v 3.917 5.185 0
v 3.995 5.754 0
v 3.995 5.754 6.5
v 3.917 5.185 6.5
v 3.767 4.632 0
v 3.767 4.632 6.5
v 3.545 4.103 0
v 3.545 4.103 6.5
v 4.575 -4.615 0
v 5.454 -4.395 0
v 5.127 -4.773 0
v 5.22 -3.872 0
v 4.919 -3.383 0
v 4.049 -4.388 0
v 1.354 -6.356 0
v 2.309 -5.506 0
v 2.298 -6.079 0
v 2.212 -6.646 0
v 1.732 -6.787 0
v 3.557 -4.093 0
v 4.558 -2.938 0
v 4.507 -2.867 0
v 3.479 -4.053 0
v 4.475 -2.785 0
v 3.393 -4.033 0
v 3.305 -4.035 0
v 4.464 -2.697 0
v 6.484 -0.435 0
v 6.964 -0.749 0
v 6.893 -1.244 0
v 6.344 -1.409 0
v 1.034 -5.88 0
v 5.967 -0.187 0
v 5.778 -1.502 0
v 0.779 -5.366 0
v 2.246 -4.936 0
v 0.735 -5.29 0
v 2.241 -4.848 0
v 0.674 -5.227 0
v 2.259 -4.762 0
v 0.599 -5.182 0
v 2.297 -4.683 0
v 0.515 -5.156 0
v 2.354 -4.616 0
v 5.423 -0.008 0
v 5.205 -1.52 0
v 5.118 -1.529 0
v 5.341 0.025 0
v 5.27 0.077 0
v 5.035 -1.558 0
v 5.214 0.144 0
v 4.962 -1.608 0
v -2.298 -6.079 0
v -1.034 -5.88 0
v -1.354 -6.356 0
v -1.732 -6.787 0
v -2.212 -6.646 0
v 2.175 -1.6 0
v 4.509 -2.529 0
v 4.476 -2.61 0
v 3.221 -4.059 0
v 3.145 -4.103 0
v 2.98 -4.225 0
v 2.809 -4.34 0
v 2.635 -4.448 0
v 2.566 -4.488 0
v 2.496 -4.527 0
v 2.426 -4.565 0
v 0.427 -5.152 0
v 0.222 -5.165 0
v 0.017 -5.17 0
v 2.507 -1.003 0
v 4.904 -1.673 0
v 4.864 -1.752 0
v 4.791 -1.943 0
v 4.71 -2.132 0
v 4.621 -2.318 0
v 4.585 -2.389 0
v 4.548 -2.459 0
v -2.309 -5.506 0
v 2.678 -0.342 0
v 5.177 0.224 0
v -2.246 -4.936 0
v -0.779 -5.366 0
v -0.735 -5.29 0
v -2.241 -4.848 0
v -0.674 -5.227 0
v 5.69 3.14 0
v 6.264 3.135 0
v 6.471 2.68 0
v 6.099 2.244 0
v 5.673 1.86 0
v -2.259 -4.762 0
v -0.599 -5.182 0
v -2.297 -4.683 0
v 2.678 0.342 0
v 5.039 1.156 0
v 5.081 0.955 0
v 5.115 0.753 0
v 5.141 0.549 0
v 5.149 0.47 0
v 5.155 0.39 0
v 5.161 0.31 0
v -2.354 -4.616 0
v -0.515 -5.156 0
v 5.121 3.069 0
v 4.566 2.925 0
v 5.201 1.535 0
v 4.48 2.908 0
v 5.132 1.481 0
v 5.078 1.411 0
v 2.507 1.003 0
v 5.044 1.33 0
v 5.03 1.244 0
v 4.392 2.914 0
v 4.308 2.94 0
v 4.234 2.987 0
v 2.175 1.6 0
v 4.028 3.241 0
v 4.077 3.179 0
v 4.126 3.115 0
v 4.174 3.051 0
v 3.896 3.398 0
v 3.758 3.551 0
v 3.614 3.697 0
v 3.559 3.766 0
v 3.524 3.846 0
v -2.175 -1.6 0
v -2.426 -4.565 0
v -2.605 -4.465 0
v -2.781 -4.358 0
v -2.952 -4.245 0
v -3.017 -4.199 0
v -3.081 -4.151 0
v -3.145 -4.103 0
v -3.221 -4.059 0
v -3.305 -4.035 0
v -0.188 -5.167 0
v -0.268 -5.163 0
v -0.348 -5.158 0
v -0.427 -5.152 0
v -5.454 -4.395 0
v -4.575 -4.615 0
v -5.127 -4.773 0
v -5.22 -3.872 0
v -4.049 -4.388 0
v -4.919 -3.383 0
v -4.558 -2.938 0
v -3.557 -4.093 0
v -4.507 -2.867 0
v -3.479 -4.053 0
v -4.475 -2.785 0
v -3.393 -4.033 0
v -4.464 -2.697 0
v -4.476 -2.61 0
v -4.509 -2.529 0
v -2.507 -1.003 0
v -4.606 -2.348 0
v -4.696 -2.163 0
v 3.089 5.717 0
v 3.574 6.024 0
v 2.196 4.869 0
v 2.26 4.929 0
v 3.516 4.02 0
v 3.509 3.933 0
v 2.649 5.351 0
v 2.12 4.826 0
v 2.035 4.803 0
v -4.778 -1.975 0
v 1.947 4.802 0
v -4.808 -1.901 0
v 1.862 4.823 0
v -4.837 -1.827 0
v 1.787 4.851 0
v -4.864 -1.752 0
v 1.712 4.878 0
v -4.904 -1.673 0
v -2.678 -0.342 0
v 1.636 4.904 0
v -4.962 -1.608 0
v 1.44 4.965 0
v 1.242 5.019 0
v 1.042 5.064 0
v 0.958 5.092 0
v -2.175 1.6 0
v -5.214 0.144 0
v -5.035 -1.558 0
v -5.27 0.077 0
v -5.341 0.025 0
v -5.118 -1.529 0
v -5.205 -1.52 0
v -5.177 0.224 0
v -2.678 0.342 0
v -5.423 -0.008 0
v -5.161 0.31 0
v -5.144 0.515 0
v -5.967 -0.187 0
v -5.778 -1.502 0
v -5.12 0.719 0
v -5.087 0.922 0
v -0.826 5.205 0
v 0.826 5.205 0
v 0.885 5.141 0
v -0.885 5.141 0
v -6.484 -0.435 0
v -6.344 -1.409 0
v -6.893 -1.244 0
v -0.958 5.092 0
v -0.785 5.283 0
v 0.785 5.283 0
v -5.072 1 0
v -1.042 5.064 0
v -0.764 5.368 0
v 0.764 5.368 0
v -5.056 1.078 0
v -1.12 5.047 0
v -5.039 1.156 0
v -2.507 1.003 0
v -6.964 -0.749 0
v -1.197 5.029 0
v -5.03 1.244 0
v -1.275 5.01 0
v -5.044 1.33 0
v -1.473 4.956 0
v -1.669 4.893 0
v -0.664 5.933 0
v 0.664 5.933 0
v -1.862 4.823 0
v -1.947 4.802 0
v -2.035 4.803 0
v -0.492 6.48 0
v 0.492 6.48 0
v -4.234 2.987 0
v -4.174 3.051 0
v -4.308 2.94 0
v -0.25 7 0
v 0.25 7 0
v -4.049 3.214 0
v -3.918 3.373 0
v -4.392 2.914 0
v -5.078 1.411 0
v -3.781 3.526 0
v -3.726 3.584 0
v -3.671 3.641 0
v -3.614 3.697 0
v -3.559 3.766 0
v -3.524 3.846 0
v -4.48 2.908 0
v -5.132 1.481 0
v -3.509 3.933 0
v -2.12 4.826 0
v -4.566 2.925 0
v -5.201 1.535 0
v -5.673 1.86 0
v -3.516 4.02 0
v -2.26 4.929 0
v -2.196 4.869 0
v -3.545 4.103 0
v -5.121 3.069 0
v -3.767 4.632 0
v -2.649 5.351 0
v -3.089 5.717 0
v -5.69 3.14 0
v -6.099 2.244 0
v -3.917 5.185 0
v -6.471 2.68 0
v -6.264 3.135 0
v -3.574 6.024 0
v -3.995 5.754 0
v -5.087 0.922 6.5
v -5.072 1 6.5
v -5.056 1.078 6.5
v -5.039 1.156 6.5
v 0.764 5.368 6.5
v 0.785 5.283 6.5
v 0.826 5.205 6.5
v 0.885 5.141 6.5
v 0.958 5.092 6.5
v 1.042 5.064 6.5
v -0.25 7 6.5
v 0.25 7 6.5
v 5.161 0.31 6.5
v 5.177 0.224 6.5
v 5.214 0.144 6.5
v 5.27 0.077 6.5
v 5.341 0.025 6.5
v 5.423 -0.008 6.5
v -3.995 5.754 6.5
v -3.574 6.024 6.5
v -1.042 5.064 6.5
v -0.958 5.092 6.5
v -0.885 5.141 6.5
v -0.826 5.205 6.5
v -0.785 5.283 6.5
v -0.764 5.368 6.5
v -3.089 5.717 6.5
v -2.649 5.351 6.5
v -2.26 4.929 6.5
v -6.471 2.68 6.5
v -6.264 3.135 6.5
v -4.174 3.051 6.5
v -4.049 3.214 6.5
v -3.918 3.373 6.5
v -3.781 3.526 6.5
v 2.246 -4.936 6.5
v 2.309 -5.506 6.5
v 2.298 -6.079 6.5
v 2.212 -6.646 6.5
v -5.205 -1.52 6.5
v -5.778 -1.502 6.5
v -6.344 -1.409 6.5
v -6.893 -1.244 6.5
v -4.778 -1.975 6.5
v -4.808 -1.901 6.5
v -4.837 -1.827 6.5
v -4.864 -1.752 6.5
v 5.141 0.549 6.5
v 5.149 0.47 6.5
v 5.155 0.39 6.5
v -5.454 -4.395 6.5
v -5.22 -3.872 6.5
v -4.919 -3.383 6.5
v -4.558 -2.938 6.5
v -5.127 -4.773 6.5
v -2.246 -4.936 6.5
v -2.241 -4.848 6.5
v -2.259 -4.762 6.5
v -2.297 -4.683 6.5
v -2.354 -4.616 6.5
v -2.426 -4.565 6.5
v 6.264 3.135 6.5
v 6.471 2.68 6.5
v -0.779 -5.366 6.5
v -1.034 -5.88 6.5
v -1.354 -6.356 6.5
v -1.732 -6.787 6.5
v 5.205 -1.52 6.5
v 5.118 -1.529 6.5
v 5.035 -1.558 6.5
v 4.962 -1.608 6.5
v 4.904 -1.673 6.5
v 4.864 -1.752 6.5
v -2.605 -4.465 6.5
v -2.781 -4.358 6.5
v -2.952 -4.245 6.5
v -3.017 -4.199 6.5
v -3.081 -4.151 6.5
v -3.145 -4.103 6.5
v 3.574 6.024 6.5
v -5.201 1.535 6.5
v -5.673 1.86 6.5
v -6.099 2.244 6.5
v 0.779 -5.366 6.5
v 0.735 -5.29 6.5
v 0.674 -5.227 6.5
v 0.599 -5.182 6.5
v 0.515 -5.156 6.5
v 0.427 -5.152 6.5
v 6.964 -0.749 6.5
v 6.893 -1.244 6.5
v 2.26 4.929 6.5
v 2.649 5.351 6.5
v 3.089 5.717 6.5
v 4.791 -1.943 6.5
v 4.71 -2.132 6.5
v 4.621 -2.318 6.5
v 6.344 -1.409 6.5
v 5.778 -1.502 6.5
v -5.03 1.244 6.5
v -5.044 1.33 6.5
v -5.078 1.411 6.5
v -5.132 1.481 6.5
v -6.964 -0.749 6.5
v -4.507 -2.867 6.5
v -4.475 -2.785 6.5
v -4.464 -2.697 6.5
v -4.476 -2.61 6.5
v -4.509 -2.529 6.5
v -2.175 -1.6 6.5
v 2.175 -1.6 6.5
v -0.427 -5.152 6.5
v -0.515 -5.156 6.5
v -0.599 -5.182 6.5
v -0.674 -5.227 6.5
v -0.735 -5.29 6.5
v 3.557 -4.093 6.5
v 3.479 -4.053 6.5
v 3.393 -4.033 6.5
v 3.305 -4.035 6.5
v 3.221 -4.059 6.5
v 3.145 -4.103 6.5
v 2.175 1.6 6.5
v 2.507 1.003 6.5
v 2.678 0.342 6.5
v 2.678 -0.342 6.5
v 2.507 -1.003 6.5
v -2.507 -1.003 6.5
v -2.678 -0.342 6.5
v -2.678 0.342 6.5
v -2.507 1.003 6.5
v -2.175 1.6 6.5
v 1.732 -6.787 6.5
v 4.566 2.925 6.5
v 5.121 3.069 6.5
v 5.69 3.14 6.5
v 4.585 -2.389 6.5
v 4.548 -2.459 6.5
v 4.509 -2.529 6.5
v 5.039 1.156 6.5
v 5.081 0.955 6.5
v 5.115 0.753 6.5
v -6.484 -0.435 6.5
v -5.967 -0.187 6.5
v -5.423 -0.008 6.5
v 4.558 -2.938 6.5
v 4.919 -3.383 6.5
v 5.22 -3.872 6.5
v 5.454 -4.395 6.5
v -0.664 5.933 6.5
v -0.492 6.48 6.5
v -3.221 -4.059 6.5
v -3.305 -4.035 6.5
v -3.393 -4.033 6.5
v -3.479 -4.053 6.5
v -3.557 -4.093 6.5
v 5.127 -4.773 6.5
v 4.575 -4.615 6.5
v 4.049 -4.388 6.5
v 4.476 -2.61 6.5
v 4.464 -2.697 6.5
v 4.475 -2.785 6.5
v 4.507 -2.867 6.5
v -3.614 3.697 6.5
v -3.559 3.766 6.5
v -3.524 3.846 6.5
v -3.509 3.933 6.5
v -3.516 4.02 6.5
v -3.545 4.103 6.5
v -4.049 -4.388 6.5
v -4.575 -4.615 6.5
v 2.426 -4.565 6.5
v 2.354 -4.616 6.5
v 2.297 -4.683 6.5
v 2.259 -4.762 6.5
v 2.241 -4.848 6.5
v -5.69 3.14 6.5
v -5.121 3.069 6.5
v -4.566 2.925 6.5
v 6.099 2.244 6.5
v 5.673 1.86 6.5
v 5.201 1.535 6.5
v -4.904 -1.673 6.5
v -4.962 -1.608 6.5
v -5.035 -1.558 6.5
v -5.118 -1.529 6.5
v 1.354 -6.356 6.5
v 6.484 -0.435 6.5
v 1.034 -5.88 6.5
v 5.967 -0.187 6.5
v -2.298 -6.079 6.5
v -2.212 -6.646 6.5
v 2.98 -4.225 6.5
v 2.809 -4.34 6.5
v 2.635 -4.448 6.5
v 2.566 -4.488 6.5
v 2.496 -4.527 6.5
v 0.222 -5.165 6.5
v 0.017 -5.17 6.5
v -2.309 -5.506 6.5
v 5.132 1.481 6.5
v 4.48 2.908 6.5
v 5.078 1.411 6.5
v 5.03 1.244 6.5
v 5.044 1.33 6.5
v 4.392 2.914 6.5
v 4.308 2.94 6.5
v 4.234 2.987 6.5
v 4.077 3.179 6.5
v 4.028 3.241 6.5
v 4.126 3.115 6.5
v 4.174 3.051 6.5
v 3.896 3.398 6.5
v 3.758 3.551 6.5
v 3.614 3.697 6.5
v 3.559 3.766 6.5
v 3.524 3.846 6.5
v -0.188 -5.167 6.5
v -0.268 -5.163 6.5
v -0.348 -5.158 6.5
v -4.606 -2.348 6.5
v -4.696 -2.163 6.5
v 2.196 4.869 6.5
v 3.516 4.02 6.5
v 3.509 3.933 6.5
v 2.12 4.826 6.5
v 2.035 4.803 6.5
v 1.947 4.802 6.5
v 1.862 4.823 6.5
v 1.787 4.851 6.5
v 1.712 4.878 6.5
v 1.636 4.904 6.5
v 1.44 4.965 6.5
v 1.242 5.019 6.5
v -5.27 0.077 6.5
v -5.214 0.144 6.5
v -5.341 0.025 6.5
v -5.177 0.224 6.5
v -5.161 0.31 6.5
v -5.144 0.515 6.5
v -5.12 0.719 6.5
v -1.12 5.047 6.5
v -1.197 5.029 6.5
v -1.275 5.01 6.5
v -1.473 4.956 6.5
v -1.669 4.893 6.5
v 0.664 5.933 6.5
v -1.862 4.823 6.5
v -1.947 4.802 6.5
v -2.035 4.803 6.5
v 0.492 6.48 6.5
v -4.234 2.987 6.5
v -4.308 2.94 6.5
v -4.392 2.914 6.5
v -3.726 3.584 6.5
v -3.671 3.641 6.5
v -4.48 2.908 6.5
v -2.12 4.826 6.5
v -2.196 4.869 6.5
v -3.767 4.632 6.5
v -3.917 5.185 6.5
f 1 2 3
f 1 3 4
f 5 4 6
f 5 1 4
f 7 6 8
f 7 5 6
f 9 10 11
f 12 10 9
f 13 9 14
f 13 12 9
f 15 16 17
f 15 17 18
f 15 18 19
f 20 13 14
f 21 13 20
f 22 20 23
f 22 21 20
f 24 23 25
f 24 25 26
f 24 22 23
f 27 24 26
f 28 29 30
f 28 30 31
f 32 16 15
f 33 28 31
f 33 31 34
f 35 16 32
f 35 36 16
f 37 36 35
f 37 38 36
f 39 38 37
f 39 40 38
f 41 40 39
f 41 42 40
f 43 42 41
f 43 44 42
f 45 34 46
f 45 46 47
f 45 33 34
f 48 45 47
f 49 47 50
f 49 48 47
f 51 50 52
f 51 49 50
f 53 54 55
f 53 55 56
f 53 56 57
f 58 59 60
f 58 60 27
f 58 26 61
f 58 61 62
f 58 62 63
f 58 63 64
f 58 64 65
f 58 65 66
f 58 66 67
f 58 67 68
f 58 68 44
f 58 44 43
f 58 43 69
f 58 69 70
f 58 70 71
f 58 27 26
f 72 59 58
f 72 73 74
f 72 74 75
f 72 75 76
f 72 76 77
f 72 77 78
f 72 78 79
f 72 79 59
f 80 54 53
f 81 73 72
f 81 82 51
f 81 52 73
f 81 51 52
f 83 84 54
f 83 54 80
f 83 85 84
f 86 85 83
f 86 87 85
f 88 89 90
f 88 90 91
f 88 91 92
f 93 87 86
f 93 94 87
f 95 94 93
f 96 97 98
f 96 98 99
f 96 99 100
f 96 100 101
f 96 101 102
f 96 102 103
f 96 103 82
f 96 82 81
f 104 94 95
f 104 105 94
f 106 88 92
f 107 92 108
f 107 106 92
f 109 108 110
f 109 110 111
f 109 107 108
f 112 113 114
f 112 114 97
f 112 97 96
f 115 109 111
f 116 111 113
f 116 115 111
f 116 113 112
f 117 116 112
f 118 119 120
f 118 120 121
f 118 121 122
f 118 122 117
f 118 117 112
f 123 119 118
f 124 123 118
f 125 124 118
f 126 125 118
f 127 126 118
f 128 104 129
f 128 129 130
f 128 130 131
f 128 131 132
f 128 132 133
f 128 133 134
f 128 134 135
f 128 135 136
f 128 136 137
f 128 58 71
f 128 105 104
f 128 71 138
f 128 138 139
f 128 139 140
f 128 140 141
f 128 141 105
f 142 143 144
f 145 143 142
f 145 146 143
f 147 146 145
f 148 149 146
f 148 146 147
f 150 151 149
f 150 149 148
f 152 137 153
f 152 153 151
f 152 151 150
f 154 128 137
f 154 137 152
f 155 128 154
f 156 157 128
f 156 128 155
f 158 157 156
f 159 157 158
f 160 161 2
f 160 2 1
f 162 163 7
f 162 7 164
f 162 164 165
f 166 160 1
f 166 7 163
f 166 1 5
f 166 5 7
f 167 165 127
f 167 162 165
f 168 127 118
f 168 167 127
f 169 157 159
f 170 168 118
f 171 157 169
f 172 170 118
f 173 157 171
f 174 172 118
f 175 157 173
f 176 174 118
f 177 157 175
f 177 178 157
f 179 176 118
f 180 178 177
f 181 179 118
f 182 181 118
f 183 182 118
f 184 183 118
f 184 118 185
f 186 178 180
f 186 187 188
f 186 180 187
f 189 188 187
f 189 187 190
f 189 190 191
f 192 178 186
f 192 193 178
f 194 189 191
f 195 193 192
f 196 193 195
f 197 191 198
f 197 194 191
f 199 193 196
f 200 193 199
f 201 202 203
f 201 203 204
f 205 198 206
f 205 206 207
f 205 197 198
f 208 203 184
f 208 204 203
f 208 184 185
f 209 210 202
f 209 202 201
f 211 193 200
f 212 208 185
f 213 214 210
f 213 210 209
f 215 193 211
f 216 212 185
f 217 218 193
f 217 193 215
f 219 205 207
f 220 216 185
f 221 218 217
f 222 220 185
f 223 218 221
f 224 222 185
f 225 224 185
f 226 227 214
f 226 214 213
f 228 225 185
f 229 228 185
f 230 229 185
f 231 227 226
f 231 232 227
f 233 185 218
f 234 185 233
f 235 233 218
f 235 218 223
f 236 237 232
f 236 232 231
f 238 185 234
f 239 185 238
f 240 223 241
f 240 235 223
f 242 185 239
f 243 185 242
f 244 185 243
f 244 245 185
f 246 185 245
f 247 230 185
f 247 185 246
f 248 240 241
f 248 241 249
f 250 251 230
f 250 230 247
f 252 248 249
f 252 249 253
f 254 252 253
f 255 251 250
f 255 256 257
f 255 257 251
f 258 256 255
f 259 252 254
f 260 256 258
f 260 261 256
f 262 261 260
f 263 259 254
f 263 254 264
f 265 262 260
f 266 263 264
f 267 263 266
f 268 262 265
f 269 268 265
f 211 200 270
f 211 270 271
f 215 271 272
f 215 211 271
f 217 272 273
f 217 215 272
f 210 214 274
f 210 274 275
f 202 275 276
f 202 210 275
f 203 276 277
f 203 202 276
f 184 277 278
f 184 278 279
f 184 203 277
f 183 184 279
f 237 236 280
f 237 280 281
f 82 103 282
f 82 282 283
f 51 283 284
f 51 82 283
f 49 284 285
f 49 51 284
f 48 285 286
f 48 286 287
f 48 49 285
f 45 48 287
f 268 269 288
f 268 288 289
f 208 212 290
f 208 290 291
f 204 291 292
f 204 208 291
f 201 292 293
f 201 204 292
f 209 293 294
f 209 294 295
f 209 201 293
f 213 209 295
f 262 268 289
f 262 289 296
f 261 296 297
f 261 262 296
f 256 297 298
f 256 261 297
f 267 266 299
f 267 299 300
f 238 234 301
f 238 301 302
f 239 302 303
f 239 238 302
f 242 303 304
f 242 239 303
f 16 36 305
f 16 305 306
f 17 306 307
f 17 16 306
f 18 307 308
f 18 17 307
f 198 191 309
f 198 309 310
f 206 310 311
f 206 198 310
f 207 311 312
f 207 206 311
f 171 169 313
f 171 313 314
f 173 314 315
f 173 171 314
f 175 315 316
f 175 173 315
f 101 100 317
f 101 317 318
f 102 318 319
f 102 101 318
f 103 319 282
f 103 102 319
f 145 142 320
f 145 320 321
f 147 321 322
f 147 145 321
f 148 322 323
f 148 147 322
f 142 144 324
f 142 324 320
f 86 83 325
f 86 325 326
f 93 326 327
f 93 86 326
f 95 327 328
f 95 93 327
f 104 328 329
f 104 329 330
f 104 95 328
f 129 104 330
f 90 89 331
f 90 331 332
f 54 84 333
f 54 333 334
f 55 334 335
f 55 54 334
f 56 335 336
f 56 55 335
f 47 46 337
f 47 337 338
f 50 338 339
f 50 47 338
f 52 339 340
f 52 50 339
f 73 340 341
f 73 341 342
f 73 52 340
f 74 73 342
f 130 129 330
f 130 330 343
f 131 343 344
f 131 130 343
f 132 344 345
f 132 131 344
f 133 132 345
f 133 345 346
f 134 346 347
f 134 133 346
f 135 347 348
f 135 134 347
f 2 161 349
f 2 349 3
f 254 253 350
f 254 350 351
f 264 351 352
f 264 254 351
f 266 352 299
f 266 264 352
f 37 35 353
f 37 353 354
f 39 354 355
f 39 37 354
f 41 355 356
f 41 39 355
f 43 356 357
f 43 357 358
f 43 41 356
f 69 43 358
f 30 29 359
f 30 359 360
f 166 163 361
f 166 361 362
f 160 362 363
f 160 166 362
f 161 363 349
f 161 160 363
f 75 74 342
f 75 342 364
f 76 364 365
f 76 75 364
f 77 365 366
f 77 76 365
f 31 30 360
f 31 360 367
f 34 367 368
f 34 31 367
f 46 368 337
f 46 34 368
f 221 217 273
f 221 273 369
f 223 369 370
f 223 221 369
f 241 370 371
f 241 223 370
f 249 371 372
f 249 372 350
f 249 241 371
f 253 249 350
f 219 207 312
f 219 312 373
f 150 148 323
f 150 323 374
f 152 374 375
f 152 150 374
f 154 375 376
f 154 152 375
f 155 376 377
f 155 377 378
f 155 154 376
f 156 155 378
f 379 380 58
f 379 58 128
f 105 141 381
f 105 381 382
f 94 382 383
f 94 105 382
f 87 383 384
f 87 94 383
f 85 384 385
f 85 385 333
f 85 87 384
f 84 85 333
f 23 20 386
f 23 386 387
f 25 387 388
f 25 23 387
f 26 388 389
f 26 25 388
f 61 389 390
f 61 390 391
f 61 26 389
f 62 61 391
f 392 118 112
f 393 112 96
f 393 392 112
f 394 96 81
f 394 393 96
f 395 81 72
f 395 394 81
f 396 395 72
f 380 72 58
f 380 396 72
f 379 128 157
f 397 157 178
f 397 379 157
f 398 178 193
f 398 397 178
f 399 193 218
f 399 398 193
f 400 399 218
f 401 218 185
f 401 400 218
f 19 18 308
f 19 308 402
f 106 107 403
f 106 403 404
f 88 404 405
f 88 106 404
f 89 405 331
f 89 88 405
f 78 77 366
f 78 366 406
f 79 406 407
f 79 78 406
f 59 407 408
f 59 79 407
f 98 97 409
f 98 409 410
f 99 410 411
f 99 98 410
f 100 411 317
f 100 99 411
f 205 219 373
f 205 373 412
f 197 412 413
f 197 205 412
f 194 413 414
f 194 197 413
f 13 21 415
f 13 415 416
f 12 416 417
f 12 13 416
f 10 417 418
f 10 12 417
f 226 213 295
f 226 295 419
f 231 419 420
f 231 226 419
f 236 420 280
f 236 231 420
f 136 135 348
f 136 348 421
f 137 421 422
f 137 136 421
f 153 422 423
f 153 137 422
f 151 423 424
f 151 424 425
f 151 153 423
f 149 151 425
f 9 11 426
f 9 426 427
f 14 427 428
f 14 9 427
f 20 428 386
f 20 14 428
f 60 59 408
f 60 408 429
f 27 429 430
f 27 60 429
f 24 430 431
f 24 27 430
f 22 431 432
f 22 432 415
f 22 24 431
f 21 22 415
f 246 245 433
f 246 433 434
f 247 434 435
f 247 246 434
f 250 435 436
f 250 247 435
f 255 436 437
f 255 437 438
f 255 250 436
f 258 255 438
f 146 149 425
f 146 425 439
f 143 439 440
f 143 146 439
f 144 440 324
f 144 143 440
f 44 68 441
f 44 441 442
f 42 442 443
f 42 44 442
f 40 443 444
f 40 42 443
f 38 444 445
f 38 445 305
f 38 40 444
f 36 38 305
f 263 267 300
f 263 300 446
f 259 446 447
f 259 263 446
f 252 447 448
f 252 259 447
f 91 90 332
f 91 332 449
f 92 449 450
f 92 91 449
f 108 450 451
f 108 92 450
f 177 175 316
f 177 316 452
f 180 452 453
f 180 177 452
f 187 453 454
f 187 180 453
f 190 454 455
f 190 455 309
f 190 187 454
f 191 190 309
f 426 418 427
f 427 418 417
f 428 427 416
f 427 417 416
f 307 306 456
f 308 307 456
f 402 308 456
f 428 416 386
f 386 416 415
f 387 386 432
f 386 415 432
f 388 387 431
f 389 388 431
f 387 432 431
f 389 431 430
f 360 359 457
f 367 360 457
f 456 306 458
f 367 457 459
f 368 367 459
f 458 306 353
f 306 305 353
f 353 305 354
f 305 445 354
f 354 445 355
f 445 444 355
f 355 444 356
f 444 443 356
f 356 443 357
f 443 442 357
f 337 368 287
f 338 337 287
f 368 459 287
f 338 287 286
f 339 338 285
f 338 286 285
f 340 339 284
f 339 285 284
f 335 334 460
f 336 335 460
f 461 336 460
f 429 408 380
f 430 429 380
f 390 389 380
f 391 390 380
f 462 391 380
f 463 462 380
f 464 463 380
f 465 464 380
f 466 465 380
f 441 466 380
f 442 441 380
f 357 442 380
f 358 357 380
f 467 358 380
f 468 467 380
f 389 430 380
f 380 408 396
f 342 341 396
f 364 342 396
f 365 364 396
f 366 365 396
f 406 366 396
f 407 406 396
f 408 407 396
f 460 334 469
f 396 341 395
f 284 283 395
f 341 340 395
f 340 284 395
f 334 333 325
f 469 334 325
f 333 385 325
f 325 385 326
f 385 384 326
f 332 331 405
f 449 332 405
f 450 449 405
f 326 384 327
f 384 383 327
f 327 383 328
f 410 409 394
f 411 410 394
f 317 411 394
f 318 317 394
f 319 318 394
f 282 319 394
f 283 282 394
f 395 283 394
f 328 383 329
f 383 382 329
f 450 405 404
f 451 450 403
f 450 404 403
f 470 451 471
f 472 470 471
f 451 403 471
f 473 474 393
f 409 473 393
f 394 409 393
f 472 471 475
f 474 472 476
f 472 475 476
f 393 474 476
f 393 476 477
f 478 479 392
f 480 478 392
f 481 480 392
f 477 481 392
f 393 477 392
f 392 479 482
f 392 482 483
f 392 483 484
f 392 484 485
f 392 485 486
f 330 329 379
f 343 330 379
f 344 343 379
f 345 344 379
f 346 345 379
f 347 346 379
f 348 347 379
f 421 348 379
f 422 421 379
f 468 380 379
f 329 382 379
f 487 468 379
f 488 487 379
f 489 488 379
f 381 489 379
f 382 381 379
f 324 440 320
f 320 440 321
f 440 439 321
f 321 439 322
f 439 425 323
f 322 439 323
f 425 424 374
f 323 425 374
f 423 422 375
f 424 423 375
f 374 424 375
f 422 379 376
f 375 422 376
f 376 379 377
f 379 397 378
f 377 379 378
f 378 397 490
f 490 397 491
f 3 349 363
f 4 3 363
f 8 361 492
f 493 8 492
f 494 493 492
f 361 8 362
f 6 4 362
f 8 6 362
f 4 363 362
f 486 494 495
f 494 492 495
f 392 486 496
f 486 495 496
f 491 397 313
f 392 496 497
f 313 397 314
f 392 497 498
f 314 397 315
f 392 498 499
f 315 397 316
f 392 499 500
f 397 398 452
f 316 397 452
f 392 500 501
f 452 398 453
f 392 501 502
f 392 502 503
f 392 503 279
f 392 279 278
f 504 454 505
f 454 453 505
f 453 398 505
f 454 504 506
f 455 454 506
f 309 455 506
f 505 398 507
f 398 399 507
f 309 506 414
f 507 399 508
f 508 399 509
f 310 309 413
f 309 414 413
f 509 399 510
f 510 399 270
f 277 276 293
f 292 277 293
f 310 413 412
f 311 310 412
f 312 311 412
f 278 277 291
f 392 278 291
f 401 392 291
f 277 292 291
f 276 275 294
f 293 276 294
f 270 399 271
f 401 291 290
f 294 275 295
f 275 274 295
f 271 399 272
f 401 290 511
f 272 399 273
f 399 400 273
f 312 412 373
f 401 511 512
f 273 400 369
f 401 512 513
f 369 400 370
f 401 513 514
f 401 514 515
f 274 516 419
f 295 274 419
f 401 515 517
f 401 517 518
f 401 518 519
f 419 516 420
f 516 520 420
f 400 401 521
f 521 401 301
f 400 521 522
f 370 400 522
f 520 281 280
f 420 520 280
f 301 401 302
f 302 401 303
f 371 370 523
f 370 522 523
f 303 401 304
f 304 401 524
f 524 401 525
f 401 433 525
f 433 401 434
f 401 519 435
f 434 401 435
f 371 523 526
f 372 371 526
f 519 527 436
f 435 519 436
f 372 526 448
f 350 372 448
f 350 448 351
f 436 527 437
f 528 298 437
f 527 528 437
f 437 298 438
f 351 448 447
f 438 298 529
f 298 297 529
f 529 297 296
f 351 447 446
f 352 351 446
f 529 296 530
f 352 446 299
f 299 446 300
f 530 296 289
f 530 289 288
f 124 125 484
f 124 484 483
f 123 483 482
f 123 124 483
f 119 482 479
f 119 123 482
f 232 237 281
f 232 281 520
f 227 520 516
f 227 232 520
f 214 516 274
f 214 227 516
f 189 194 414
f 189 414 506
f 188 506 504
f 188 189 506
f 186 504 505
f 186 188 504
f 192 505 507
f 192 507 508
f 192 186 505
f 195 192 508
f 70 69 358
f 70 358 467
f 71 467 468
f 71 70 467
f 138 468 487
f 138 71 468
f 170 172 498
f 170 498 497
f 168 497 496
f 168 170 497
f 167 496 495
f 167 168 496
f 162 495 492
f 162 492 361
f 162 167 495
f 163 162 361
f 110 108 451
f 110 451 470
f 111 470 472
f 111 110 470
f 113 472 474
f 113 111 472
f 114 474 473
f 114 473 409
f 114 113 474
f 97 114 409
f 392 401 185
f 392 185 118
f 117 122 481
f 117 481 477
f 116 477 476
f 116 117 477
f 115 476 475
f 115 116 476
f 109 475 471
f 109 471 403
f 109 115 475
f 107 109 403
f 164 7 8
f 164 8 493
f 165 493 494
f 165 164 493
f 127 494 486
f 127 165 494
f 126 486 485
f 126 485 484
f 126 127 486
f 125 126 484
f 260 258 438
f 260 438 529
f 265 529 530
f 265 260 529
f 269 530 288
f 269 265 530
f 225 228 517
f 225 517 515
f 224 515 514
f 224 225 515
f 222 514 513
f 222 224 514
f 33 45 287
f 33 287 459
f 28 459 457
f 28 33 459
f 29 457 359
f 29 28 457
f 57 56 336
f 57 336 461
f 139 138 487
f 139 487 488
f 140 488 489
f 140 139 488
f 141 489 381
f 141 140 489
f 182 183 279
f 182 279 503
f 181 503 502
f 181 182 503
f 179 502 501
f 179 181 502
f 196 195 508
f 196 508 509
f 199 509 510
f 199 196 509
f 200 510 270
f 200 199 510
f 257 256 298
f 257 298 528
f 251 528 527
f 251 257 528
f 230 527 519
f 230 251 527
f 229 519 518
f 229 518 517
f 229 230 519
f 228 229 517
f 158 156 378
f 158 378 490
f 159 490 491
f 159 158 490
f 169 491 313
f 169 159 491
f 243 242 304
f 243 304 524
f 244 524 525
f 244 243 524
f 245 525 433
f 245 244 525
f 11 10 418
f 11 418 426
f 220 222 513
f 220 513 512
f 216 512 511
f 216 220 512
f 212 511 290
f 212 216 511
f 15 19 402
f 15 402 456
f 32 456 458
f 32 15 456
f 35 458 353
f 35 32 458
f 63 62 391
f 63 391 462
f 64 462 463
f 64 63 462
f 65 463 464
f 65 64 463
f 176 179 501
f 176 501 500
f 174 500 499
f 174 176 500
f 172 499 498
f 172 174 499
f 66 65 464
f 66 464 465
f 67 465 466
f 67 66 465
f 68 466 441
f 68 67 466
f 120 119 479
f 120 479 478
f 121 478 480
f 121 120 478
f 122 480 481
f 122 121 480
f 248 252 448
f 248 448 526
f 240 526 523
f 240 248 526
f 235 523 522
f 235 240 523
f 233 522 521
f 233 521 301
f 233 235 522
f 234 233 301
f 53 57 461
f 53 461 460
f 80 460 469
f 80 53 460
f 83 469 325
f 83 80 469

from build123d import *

# Parameters (mm, degrees)
BOSS_EXTRU_1_DEPTH           = 6.5
R_P_TITION_CIRCULAIRE1_COUNT = 11
ENL_V_MAT_EXTRU_1_REACH      = 13.822


with BuildPart() as part:
    # Esquisse1 → Boss.-Extru.1 (new body)
    with BuildSketch(Plane.XY):
        with BuildLine():
            Line((2.665741612, 4.429754131), (0, 0))
            Line((0, 0), (-1.27495348, 5.010328694))
            ThreePointArc((-1.27495348, 5.010328694), (-1.158589319, 5.038508786), (-1.041603805, 5.063986721))
            ThreePointArc((-1.041603805, 5.063986721), (-0.853375021, 5.171115564), (-0.764222128, 5.368494453))
            ThreePointArc((-0.764222128, 5.368494453), (-0.587161287, 6.209477662), (-0.25, 7))
            Line((-0.25, 7), (0.25, 7))
            ThreePointArc((0.25, 7), (0.587161287, 6.209477662), (0.764222128, 5.368494453))
            ThreePointArc((0.764222128, 5.368494453), (0.853375021, 5.171115564), (1.041603805, 5.063986721))
            ThreePointArc((1.041603805, 5.063986721), (1.880602365, 4.815831677), (2.665741612, 4.429754131))
        make_face()
    boss_extru_1 = extrude(amount=BOSS_EXTRU_1_DEPTH)

    # Répétition circulaire1: Boss.-Extru.1 ×11 about axis
    r_p_tition_circulaire1_axis = Axis((0, 0, 6.5), (0, 0, -1))
    for i in range(1, R_P_TITION_CIRCULAIRE1_COUNT):
        add(boss_extru_1.rotate(r_p_tition_circulaire1_axis, i * 360 / R_P_TITION_CIRCULAIRE1_COUNT))

    # Esquisse2 → Enlèv. mat.-Extru.1 (cut, up to next)
    with BuildSketch(Plane.XY.offset(6.5), mode=Mode.PRIVATE) as enl_v_mat_extru_1_sk1:
        with BuildLine():
            Line((-2.174856317, 1.6), (2.174856317, 1.6))
            ThreePointArc((2.174856317, 1.6), (2.7, 0), (2.174856317, -1.6))
            Line((2.174856317, -1.6), (-2.174856317, -1.6))
            ThreePointArc((-2.174856317, -1.6), (-2.7, 0), (-2.174856317, 1.6))
        make_face()
    enl_v_mat_extru_1_tool1 = extrude(enl_v_mat_extru_1_sk1.sketch, amount=-ENL_V_MAT_EXTRU_1_REACH, mode=Mode.PRIVATE) & part.part
    add(enl_v_mat_extru_1_tool1.solids().sort_by_distance((0, 0, 6.5))[0], mode=Mode.SUBTRACT)


solid = part.part
